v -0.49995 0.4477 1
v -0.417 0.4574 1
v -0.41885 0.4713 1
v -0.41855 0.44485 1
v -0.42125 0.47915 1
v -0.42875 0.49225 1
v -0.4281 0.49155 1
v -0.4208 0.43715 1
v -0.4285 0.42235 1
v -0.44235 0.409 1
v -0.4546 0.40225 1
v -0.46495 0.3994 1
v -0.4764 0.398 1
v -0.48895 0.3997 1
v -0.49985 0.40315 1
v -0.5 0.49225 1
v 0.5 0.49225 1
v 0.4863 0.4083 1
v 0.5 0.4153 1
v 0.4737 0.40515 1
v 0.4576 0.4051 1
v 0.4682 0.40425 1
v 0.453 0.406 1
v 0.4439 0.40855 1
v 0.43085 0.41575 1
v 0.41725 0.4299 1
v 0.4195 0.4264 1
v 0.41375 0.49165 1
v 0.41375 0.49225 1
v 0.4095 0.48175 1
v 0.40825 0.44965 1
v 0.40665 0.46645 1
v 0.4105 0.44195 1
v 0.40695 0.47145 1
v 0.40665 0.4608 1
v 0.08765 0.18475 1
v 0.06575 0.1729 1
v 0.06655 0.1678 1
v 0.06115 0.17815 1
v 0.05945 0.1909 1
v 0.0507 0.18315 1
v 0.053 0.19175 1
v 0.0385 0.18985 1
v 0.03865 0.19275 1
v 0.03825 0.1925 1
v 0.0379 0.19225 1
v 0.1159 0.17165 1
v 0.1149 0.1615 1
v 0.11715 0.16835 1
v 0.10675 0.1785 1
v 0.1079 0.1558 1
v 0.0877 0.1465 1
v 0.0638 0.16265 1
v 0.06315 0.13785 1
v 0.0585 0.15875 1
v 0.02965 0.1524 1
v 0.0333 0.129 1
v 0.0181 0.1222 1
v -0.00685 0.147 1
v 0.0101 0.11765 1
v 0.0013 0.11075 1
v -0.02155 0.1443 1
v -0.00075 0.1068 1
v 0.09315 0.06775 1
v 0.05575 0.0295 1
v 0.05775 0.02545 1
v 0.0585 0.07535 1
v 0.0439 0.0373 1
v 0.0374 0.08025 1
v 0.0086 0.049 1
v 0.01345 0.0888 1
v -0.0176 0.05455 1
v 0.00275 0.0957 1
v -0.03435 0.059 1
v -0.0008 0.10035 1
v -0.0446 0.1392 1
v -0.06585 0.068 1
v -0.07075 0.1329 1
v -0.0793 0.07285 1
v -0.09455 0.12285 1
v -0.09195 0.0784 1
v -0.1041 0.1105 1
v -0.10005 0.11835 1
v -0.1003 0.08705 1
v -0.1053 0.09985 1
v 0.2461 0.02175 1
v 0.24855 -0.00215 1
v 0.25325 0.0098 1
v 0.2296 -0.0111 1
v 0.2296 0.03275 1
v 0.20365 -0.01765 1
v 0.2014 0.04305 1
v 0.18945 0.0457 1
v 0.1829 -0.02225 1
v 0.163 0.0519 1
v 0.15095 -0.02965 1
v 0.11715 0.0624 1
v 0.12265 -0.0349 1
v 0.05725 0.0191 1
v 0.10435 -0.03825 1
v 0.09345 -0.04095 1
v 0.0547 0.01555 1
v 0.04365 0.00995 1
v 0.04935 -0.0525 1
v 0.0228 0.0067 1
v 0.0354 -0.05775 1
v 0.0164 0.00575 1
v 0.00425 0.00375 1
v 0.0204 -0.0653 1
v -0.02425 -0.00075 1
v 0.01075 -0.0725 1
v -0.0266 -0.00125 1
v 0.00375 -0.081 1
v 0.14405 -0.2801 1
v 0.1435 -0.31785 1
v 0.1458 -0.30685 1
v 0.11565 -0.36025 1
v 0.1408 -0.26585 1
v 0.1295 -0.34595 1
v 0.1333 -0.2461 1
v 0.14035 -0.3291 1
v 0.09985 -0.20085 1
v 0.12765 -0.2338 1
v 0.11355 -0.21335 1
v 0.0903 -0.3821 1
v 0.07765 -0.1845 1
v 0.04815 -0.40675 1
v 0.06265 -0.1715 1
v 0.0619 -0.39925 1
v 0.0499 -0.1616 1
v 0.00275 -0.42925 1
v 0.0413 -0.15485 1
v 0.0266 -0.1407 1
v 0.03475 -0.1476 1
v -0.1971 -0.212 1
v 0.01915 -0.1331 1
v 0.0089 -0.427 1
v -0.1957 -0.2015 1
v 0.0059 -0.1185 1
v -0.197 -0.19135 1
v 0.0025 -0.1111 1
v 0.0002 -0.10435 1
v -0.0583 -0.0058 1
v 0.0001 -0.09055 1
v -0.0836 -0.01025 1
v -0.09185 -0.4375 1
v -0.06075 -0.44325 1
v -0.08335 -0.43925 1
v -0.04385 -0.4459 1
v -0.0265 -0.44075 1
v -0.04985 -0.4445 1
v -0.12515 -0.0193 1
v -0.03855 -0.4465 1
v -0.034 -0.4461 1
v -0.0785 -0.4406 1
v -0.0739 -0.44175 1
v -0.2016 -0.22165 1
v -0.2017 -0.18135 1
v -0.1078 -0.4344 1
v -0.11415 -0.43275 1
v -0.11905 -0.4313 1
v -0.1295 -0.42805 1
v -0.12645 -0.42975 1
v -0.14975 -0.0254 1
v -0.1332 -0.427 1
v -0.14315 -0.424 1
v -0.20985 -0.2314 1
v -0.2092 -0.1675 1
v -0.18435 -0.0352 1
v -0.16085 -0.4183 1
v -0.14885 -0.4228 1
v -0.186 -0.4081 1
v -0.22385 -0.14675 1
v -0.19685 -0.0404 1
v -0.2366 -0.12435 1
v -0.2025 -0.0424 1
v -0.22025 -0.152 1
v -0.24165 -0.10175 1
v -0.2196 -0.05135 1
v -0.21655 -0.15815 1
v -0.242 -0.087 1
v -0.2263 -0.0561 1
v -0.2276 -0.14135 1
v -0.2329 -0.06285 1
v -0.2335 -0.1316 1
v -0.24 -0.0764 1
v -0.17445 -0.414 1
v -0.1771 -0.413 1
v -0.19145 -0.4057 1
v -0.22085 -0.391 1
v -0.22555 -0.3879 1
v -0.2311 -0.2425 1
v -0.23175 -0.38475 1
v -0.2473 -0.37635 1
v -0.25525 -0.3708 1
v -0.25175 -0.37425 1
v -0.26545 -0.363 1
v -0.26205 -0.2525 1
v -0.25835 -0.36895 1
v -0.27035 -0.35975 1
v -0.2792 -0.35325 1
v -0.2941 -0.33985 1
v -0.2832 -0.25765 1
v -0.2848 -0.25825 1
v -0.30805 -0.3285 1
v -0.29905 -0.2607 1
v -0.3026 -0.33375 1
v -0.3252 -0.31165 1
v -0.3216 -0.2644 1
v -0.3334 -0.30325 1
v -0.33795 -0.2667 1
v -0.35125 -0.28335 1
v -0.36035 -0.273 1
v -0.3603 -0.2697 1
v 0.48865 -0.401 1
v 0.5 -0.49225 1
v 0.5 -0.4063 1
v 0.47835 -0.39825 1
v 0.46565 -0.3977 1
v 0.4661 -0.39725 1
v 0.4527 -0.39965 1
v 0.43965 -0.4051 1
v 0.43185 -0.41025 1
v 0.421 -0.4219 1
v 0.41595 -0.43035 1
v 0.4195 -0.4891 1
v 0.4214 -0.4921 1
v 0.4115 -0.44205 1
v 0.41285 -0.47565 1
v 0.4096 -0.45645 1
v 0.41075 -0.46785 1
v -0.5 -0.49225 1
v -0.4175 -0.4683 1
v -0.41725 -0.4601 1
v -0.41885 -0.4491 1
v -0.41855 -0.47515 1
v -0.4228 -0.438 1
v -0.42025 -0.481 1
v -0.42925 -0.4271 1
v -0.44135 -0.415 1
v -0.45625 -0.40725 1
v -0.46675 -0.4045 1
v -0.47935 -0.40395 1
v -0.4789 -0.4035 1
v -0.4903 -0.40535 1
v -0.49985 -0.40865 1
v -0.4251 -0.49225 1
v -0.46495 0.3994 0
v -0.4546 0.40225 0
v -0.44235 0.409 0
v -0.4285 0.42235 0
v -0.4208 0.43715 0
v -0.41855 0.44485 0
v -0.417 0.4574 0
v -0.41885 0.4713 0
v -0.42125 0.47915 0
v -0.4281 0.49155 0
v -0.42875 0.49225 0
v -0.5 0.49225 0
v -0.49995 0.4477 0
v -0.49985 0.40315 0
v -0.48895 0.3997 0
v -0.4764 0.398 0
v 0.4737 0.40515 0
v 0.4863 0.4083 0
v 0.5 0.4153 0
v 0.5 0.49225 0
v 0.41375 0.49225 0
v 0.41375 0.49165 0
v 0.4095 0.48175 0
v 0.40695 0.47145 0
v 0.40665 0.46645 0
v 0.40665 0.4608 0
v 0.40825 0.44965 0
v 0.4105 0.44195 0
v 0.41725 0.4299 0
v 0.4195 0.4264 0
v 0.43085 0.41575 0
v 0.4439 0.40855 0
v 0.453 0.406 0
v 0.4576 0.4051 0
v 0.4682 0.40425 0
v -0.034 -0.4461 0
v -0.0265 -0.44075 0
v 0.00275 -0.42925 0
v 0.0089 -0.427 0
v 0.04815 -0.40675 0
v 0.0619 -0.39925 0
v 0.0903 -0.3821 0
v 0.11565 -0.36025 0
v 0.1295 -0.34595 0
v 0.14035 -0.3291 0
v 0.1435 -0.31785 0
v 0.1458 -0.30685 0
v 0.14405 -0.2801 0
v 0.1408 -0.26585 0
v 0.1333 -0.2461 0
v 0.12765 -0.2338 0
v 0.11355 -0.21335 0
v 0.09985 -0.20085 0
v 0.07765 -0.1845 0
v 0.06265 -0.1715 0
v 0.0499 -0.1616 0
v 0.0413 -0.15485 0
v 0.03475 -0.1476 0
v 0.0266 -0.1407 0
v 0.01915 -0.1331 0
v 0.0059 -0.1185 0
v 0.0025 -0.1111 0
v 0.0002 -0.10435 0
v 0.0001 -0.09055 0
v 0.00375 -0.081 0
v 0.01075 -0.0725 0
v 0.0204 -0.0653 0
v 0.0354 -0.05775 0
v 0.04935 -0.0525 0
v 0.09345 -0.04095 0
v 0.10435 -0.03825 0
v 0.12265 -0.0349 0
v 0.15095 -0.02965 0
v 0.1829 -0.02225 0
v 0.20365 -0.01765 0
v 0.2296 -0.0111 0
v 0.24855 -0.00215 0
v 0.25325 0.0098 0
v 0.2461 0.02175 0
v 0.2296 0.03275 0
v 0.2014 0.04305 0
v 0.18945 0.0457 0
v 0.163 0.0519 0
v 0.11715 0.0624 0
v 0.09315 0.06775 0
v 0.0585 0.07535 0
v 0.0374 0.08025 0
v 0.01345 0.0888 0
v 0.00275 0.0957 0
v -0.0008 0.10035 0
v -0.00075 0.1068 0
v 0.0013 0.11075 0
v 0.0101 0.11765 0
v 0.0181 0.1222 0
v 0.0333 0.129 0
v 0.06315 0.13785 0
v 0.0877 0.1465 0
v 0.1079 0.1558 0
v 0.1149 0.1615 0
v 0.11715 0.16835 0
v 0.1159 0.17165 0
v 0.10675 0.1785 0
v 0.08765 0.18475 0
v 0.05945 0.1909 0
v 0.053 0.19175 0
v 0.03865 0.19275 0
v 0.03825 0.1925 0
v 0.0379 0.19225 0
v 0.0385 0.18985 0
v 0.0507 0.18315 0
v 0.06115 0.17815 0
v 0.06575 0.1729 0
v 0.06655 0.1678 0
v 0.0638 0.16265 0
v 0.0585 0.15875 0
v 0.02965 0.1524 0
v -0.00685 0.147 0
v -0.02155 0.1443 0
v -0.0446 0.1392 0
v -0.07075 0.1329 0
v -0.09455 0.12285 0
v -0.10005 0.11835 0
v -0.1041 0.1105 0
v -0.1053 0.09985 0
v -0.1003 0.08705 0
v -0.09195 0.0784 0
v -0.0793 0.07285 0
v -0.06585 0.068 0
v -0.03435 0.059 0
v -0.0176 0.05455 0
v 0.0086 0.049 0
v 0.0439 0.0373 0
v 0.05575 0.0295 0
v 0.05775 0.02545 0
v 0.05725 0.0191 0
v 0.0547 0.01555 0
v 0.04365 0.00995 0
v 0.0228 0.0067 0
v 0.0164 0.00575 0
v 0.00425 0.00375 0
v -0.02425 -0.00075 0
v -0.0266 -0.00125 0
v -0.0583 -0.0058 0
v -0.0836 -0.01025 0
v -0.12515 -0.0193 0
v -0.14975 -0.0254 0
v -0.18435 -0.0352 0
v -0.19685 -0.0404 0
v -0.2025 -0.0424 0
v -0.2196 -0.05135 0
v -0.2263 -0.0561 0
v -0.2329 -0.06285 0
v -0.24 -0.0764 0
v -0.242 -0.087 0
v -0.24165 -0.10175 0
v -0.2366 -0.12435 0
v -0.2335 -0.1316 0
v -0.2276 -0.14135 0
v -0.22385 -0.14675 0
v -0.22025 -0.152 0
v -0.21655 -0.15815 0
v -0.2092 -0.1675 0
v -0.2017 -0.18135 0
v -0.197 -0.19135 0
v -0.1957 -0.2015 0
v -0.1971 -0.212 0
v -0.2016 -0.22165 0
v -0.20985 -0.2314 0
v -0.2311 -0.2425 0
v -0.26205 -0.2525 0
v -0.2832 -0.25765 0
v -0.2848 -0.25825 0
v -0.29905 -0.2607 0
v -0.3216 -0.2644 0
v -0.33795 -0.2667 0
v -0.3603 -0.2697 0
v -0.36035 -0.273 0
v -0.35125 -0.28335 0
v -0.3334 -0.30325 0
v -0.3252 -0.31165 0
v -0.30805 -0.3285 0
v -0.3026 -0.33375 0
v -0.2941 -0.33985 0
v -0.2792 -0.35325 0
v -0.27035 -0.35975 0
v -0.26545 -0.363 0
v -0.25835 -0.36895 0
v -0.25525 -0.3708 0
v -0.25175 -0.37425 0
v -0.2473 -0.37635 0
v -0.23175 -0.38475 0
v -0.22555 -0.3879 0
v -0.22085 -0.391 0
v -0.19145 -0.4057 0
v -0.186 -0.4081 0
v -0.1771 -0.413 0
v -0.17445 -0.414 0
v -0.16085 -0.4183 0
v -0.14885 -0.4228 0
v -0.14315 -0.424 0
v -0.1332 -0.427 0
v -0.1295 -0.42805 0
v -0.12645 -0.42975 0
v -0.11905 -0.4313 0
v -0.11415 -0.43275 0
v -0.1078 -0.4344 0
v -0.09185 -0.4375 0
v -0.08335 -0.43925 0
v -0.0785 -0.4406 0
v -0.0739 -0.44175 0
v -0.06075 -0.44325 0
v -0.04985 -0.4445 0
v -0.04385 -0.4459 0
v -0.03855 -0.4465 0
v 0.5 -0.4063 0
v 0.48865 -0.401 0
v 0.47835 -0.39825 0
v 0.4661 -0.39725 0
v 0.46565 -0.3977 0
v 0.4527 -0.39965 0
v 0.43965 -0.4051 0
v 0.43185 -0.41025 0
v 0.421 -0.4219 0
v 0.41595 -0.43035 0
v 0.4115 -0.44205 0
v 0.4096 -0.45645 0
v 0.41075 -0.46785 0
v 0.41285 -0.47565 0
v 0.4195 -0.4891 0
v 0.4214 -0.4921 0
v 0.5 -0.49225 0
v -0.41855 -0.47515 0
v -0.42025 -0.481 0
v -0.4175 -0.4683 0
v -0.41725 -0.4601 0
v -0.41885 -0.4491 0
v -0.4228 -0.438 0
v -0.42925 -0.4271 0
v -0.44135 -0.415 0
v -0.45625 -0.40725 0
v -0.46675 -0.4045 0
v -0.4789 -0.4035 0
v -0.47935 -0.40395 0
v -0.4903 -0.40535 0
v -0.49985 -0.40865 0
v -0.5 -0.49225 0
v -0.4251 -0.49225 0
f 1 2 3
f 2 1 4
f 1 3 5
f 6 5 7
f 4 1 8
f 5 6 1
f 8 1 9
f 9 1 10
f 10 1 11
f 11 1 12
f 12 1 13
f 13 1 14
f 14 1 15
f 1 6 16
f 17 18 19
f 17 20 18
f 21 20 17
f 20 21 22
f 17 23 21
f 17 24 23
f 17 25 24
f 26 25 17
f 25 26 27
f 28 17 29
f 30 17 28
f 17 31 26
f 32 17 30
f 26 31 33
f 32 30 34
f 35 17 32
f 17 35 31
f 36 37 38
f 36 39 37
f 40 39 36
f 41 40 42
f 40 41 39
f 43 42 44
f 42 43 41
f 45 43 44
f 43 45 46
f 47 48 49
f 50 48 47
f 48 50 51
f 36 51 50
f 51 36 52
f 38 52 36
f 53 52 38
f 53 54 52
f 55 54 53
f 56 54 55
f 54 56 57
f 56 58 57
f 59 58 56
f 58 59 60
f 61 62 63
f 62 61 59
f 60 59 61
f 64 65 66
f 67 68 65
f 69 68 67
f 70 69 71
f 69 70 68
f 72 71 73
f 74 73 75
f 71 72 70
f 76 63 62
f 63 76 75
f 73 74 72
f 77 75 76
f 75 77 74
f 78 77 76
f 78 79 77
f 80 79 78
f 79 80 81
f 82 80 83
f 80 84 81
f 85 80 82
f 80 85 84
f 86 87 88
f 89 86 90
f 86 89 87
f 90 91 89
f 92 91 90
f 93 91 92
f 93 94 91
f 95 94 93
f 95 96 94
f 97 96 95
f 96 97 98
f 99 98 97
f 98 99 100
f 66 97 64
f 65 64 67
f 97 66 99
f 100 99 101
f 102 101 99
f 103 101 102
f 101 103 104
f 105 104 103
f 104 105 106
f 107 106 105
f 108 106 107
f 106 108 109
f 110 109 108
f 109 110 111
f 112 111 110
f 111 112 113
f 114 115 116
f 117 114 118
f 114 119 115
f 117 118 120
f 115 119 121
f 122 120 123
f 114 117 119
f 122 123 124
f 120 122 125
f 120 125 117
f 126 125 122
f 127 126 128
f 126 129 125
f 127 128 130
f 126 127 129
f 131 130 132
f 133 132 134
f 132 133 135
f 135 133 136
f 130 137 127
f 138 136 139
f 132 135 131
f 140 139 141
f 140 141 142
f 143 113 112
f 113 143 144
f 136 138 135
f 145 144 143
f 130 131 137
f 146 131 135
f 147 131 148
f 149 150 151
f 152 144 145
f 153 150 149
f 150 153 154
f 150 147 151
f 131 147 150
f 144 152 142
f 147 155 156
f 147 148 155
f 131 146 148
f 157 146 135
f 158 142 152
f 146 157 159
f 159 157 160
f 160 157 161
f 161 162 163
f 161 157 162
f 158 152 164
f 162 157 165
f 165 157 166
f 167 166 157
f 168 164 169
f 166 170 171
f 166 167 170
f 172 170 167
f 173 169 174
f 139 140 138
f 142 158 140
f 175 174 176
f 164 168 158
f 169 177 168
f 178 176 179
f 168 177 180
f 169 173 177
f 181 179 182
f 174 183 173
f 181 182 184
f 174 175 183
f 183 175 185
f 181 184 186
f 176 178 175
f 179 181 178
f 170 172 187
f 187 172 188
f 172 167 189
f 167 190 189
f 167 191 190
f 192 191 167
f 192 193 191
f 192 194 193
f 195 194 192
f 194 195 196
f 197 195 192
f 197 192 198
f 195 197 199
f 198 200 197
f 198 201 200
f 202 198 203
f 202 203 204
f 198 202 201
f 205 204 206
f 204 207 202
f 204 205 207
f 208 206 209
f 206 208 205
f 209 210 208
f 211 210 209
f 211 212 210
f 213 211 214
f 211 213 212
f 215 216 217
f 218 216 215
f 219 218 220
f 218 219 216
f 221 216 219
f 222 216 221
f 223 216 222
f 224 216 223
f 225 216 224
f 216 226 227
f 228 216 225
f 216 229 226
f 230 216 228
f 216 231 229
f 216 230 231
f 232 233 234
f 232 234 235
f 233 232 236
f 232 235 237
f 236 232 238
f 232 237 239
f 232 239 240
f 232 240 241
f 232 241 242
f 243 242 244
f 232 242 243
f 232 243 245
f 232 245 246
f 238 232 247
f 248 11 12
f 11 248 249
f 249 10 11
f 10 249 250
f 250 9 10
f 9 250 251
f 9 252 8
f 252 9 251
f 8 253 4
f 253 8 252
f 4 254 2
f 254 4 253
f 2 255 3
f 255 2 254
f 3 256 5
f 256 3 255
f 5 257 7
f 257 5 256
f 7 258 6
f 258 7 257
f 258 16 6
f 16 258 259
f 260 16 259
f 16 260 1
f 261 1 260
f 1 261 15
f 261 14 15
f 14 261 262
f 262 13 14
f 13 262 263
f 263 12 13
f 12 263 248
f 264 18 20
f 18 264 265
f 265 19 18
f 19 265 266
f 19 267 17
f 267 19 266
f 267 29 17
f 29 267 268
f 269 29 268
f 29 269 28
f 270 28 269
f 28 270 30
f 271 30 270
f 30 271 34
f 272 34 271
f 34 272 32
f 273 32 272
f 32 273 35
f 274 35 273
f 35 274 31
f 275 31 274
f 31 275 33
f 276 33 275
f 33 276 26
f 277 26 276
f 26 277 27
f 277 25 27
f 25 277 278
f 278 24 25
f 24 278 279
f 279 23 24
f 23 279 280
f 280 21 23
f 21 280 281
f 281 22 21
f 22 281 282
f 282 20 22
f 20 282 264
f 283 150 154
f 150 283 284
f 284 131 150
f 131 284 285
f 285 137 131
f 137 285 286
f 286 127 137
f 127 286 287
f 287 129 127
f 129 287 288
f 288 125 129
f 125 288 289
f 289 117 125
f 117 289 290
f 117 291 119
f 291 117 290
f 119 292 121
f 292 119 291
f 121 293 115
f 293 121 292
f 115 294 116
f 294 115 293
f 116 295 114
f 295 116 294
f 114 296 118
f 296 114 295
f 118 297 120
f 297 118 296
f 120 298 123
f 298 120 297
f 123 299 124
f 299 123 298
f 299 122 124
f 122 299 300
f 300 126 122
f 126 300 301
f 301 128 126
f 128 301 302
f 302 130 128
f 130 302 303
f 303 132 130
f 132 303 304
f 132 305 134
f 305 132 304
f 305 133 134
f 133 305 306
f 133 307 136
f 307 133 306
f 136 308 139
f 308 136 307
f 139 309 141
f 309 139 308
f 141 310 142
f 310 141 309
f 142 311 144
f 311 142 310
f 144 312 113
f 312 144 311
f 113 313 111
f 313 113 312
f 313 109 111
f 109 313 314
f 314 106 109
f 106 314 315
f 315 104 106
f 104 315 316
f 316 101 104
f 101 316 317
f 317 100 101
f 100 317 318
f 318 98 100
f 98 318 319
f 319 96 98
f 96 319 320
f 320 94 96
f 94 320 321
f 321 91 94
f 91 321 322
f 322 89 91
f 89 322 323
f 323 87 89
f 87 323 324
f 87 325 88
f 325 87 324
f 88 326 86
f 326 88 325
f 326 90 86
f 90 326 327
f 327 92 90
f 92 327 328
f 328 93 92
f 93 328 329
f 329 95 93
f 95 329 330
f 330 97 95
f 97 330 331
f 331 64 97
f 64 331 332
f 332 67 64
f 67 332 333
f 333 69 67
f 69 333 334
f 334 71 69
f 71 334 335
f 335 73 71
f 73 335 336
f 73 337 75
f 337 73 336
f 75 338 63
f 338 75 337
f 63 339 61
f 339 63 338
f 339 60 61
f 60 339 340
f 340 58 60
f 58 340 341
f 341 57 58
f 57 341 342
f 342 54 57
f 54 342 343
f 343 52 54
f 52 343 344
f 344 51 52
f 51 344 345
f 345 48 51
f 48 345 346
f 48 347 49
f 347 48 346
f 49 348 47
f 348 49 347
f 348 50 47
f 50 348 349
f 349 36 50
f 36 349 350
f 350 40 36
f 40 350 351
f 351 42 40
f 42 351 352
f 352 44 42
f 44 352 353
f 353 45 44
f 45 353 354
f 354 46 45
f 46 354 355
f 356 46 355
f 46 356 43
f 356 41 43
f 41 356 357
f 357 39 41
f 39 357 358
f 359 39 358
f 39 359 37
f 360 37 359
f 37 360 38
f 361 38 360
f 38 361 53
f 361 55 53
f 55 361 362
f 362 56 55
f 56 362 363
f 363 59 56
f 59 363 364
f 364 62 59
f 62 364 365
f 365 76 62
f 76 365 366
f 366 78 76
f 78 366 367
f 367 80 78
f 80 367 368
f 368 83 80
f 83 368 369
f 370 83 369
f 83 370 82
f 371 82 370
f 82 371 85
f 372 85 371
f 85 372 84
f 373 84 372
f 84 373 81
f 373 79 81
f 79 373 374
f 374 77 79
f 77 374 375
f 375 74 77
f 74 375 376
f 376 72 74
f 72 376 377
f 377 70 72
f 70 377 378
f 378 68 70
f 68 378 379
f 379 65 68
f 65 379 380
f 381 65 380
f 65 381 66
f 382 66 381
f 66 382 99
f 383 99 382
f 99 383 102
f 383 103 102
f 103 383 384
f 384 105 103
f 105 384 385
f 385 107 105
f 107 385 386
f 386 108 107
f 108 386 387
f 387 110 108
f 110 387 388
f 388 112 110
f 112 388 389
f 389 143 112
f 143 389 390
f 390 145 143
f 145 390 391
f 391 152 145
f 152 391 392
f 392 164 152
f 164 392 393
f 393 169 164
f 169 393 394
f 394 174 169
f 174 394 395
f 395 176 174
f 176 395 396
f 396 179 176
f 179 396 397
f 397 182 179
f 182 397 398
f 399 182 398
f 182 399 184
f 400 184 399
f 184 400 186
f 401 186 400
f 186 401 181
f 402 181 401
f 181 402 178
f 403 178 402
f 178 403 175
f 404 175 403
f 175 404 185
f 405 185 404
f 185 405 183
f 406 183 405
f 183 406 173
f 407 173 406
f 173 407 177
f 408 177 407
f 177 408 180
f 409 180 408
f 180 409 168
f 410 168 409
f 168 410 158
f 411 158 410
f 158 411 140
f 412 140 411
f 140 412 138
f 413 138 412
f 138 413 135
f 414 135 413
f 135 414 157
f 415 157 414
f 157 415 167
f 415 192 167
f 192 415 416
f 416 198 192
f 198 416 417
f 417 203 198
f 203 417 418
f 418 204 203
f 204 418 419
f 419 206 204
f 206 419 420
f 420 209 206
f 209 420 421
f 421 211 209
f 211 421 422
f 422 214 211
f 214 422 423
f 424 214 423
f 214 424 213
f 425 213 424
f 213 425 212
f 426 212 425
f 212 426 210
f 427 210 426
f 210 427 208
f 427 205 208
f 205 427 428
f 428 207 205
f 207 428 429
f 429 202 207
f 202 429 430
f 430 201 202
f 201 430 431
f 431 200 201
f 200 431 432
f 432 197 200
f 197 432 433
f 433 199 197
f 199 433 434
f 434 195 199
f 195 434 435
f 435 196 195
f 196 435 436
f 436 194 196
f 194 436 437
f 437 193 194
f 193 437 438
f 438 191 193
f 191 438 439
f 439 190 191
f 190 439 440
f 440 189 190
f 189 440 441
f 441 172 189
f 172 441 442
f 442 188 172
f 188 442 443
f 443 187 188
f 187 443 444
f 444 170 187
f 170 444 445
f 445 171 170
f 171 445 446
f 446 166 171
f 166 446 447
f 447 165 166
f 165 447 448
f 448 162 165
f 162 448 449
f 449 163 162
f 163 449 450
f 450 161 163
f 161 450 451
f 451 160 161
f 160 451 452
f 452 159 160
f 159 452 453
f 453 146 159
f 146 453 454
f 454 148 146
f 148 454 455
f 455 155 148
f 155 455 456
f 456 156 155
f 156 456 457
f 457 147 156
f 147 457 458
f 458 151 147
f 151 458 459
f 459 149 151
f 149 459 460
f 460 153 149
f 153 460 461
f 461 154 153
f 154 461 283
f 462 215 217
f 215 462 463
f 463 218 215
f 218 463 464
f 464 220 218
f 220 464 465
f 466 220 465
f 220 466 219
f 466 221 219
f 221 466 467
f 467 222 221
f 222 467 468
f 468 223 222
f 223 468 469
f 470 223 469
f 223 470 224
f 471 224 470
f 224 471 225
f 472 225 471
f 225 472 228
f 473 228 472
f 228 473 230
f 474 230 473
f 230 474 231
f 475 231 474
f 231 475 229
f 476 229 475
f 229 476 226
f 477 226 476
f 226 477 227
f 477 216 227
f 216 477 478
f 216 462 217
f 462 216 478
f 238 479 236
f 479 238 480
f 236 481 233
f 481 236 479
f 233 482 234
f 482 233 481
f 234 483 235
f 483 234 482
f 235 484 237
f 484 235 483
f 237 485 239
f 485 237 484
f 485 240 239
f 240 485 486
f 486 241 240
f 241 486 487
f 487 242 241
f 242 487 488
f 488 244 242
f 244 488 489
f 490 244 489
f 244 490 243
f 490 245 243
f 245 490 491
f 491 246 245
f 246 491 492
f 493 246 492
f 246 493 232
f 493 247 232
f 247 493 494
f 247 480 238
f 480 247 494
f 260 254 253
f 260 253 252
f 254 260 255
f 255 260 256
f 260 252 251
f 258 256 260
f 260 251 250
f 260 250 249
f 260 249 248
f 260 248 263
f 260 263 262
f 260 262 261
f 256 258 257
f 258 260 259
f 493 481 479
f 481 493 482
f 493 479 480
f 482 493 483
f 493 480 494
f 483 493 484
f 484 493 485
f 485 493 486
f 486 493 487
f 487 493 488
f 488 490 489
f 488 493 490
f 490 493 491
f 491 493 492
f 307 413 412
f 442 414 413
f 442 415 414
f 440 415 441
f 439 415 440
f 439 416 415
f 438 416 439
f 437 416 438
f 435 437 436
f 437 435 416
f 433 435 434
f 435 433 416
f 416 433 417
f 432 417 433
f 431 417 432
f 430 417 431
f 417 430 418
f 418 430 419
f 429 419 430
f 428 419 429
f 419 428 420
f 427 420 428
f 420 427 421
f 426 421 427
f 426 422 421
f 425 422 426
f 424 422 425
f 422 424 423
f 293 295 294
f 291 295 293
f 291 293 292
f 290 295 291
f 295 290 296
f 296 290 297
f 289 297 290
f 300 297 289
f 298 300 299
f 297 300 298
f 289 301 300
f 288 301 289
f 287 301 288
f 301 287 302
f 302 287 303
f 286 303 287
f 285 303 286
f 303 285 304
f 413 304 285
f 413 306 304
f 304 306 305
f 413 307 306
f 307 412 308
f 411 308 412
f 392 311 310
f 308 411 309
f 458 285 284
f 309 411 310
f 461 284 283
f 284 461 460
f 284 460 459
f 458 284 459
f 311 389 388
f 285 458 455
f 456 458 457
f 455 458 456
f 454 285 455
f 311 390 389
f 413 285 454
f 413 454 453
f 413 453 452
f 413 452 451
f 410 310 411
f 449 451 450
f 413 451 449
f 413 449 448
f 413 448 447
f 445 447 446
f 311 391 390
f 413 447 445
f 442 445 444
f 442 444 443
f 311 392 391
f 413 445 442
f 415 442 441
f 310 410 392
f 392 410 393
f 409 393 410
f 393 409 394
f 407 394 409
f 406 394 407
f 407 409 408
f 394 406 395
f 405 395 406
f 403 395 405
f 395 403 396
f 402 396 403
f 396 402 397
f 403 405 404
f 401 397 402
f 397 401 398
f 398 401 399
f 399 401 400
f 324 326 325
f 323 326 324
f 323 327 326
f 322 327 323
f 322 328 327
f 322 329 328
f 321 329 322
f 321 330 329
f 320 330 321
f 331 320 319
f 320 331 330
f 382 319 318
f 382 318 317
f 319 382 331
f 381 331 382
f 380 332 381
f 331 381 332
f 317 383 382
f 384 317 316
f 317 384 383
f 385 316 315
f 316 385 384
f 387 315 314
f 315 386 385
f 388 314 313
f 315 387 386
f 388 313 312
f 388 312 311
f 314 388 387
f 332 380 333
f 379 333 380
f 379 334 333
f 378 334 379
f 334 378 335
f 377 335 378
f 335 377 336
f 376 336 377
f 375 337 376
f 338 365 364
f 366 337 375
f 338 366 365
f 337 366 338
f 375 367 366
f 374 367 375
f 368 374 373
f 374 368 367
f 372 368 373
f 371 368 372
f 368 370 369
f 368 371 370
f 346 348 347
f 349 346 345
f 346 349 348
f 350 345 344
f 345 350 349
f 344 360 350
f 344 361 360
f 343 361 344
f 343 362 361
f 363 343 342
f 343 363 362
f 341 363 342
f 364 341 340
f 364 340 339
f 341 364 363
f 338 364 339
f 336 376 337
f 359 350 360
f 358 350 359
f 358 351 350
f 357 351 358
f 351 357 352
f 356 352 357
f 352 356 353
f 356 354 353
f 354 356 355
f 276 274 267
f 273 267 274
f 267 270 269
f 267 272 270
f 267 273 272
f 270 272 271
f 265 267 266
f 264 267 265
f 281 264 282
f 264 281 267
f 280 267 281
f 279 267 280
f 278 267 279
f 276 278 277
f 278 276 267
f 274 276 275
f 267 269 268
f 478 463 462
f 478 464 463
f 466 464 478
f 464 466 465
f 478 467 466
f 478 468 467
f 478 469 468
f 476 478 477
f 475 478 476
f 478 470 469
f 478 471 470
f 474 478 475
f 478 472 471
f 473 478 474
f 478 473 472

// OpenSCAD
module C1purple_1()
{
 /* Generated by trace2scad version 20150415
    http://aggregate.org/MAKE/TRACE2SCAD/
    Optimized model has 251/3093 original points
 */
 color([0.5, 0.5, 0.5])
 assign(minx=0) /* polygon minx=0 */
 assign(miny=0) /* polygon miny=0 */
 assign(maxx=20000) /* polygon maxx=20000 */
 assign(maxy=19690) /* polygon maxy=19690 */
 assign(dx=maxx-minx)
 assign(dy=maxy-miny)
 assign(maxd=((dx>dy)?dx:dy))
 scale([1/maxd, 1/maxd, 1])
 translate([-minx-dx/2, -miny-dy/2, 0])
 linear_extrude(height=1, convexity=251)
 union() {
  union() {
   polygon([[1,18799],[3,17908],[221,17839],[472,17805],[701,17833],[908,17890],[1153,18025],[1430,18292],[1584,18588],[1629,18742],[1660,18993],[1623,19271],[1575,19428],[1438,19676],[1425,19690],[0,19690]], convexity=5);
   polygon([[18275,19684],[18275,19678],[18190,19480],[18139,19274],[18133,19174],[18133,19061],[18165,18838],[18210,18684],[18345,18443],[18390,18373],[18617,18160],[18878,18016],[19060,17965],[19152,17947],[19364,17930],[19474,17948],[19726,18011],[20000,18151],[20000,19690],[18275,19690]], convexity=7);
   polygon([[10765,13695],[10758,13690],[10770,13642],[11014,13508],[11223,13408],[11315,13303],[11331,13201],[11276,13098],[11170,13020],[10593,12893],[9863,12785],[9569,12731],[9108,12629],[8585,12503],[8109,12302],[7999,12212],[7918,12055],[7894,11842],[7994,11586],[8161,11413],[8414,11302],[8683,11205],[9313,11025],[9648,10936],[10172,10825],[10878,10591],[11115,10435],[11155,10354],[11145,10227],[11094,10156],[10873,10044],[10456,9979],[10328,9960],[10085,9920],[9515,9830],[9468,9820],[8834,9729],[8328,9640],[7497,9459],[7005,9337],[6313,9141],[6063,9037],[5950,8997],[5608,8818],[5474,8723],[5342,8588],[5200,8317],[5160,8105],[5167,7810],[5268,7358],[5330,7213],[5448,7018],[5523,6910],[5595,6805],[5669,6682],[5816,6495],[5966,6218],[6060,6018],[6086,5815],[6058,5605],[5968,5412],[5803,5217],[5378,4995],[4759,4795],[4336,4692],[4304,4680],[4019,4631],[3568,4557],[3241,4511],[2794,4451],[2793,4385],[2975,4178],[3332,3780],[3496,3612],[3839,3275],[3948,3170],[4118,3048],[4416,2780],[4593,2650],[4691,2585],[4833,2466],[4895,2429],[4965,2360],[5054,2318],[5365,2150],[5489,2087],[5583,2025],[5963,1835],[6171,1731],[6280,1683],[6458,1585],[6511,1565],[6783,1479],[7023,1389],[7137,1365],[7336,1305],[7410,1284],[7471,1250],[7619,1219],[7717,1190],[7844,1157],[8163,1095],[8333,1060],[8430,1033],[8522,1010],[8785,980],[9003,955],[9123,927],[9229,915],[9320,923],[9470,1030],[10055,1260],[10178,1305],[10963,1710],[11238,1860],[11806,2203],[12313,2640],[12590,2926],[12807,3263],[12870,3488],[12916,3708],[12881,4243],[12816,4528],[12666,4923],[12553,5169],[12271,5578],[11997,5828],[11553,6155],[11253,6415],[10998,6613],[10826,6748],[10695,6893],[10532,7031],[10383,7183],[10118,7475],[10050,7623],[10004,7758],[10002,8034],[10075,8225],[10215,8395],[10408,8539],[10708,8690],[10987,8795],[11869,9026],[12087,9080],[12453,9147],[13019,9252],[13658,9400],[14073,9492],[14592,9623],[14971,9802],[15065,10041],[14922,10280],[14592,10500],[14028,10706],[13789,10759],[13260,10883],[12343,11093],[11863,11200],[11170,11352],[10748,11450],[10269,11621],[10055,11759],[9984,11852],[9985,11981],[10026,12060],[10202,12198],[10362,12289],[10666,12425],[11263,12602],[11754,12775],[12158,12961],[12298,13075],[12343,13212],[12318,13278],[12135,13415],[11753,13540],[11189,13663],[11060,13680],[10773,13700]], convexity=16);
   polygon([[19317,1895],[19313,1891],[19054,1852],[18793,1743],[18637,1640],[18420,1407],[18319,1238],[18230,1004],[18192,716],[18215,488],[18257,332],[18390,63],[18428,3],[20000,0],[20000,1719],[19773,1825],[19567,1880],[19322,1900]], convexity=6);
   polygon([[417,1770],[413,1766],[194,1738],[3,1672],[0,0],[1498,0],[1595,225],[1629,342],[1650,479],[1655,643],[1623,863],[1544,1085],[1415,1303],[1173,1545],[875,1700],[665,1755],[422,1775]], convexity=5);
  }
 }
}

module C1purple()
{
 /* all layers combined, scaled to within a 1mm cube */
 scale([1, 1, 1/1])
 difference() {
  union() {
   scale([1,1,2]) translate([0,0,-0.5]) C1purple_1();
  }
  translate([0,0,-2]) cube([2,2,4],center=true);
 }
}
C1purple();
